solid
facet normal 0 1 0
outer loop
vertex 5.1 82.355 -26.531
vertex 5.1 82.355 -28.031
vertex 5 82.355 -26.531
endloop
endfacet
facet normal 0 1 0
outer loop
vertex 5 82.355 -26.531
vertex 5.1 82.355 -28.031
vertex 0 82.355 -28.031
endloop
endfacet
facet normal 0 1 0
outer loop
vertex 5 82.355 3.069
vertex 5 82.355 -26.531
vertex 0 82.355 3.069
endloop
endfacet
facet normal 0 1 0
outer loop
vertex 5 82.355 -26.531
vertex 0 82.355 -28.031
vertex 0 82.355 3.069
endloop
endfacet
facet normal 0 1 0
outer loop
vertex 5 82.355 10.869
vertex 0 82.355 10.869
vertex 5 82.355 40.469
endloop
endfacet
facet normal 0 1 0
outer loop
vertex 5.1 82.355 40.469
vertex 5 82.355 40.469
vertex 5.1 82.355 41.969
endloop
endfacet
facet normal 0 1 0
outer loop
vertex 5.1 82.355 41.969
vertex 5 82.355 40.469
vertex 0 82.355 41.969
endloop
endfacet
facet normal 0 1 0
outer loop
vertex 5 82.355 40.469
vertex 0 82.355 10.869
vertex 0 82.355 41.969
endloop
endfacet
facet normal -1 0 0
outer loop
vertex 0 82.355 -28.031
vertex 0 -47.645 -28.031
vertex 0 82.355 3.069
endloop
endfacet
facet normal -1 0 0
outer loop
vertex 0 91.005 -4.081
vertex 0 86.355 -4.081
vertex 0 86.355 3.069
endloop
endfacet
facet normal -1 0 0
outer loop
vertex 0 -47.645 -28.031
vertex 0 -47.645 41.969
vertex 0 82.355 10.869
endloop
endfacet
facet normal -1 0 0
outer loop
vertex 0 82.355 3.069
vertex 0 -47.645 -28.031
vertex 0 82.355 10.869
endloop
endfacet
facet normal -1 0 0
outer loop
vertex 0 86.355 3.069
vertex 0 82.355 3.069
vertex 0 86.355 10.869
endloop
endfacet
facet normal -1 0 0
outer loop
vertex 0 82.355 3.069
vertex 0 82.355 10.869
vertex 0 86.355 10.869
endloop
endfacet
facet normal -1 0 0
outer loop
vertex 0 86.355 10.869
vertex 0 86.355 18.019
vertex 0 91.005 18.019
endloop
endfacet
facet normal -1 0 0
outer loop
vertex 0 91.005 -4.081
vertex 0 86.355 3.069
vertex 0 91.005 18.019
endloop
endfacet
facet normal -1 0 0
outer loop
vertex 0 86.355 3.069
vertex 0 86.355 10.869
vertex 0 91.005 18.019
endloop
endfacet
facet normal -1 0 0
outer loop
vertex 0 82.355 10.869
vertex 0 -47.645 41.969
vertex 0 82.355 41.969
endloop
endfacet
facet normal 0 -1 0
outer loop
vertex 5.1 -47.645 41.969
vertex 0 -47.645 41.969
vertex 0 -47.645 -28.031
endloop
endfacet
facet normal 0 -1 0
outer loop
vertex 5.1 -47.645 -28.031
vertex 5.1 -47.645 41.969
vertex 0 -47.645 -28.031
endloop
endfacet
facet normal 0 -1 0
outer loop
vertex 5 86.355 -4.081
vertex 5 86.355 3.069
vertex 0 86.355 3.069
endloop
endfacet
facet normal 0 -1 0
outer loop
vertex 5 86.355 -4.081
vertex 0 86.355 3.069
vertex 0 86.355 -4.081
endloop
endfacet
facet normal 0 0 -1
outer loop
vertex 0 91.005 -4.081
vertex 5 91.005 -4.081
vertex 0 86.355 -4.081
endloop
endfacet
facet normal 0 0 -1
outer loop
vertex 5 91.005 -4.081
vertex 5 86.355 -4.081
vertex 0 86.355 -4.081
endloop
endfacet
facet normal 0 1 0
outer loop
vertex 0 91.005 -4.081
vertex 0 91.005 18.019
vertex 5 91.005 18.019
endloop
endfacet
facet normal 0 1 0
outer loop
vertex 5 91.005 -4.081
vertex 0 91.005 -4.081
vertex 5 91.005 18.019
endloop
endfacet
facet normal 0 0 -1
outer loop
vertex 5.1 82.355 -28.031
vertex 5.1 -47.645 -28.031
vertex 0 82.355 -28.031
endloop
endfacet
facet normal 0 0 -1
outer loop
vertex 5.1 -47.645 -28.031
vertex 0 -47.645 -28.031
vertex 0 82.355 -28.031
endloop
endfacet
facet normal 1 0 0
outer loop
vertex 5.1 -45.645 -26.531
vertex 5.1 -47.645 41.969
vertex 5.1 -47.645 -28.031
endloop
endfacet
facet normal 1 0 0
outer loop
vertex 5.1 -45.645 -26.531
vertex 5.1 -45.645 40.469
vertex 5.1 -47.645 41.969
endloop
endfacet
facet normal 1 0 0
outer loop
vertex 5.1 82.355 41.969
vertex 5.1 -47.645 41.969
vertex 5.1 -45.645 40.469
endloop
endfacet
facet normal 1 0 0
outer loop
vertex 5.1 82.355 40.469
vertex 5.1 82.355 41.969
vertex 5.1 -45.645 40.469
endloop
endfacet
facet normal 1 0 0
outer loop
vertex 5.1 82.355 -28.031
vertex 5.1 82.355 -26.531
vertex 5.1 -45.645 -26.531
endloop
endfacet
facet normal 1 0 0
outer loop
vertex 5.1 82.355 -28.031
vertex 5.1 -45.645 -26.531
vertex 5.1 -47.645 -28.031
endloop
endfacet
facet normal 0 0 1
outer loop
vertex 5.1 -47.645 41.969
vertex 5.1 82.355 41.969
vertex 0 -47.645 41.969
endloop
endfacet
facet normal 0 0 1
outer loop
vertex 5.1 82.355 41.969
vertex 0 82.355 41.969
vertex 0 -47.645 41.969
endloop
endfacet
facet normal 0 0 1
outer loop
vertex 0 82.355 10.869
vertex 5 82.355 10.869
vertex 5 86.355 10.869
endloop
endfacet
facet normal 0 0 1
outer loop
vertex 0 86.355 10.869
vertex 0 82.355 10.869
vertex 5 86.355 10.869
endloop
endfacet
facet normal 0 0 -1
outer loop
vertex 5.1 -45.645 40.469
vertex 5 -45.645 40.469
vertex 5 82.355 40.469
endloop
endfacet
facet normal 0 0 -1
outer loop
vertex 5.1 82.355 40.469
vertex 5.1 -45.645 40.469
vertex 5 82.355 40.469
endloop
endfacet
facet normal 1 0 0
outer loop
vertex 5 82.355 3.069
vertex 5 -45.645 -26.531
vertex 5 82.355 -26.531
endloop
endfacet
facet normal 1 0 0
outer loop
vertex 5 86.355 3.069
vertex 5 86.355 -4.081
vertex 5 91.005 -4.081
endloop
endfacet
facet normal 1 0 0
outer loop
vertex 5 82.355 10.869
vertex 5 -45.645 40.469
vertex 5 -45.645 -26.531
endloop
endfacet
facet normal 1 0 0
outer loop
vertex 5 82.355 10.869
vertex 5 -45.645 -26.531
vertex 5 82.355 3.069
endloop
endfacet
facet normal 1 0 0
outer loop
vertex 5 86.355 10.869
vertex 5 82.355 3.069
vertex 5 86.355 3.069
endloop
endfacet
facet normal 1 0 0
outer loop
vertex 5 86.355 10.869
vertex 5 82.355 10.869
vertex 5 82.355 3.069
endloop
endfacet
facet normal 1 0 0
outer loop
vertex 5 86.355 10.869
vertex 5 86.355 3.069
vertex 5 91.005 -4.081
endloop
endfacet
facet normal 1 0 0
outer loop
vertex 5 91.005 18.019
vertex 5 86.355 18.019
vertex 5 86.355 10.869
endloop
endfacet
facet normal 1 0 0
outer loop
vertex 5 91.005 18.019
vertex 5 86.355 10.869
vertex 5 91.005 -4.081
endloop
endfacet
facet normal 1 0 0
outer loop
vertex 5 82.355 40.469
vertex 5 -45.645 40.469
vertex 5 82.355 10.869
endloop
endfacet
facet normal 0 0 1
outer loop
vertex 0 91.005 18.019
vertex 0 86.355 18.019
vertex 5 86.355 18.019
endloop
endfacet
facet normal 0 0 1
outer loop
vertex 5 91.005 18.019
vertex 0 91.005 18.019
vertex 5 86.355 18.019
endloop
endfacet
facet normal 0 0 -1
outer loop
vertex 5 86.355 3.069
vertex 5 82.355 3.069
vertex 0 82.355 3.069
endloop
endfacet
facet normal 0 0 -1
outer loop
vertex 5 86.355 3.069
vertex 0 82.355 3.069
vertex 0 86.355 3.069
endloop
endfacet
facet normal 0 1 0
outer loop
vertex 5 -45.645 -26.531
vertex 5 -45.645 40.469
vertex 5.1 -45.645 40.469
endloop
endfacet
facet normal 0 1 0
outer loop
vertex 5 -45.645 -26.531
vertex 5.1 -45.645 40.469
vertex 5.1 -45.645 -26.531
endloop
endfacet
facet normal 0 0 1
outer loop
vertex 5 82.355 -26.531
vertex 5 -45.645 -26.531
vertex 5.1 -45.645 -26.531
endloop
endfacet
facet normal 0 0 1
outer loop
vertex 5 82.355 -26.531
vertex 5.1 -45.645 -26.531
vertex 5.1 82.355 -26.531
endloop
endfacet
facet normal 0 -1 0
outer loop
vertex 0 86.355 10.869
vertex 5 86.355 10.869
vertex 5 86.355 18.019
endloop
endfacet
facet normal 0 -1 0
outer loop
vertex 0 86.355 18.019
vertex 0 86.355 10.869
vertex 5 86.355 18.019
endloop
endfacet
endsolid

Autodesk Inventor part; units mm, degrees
ref_plane "YZ Plane" through (0, 0, 0) normal (1, 0, 0) x (0, 1, 0)
ref_plane "XZ Plane" through (0, 0, 0) normal (0, 1, 0) x (-1, 0, 0)
ref_plane "XY Plane" through (0, 0, 0) normal (0, 0, 1) x (1, 0, 0)
sketch "Sketch1" plane through (0, 0, 0) normal (1, 0, 0) x (0, 1, 0)
  line L0 (82.3549, 41.969) -> (-47.6451, 41.969)
  line L1 (-47.6451, 41.969) -> (-47.6451, -28.031)
  line L2 (-47.6451, -28.031) -> (82.3549, -28.031)
  line L3 (82.3549, -28.031) -> (82.3549, 41.969)
  point P0 (0, 0)
  dimension "d0" = 130
  dimension "d1" = 70
extrude "Extrusion1" add sketch "Sketch1" along normal blind 5
sketch "Sketch13" plane through (5, 0, 0) normal (1, 0, 0) x (0, 0, -1)
  line L0 (-41.969, -47.6451) -> (28.031, -47.6451) projected
  line L1 (28.031, 82.3549) -> (-41.969, 82.3549) projected
  line L2 (28.031, -47.6451) -> (26.531, -47.6451)
  line L3 (26.531, -47.6451) -> (26.531, 82.3549)
  line L4 (26.531, 82.3549) -> (28.031, 82.3549)
  line L5 (28.031, 82.3549) -> (28.031, -47.6451)
  line L6 (-41.969, 82.3549) -> (-41.969, -47.6451) projected
  line L7 (28.031, 82.3549) -> (-41.969, 82.3549) projected
  line L8 (-41.969, -47.6451) -> (-40.469, -47.6451)
  line L9 (-40.469, -47.6451) -> (-40.469, 82.3549)
  line L10 (-40.469, 82.3549) -> (-41.969, 82.3549)
  line L11 (-41.969, 82.3549) -> (-41.969, -47.6451)
  line L12 (28.031, -47.6451) -> (-41.969, -47.6451)
  line L13 (-41.969, -47.6451) -> (-41.969, -45.6451)
  line L14 (-41.969, -45.6451) -> (28.031, -45.6451)
  line L15 (28.031, -45.6451) -> (28.031, -47.6451)
  point P0 (0, 0)
  point P1 (10.031, 62.3549)
  point P2 (-5.969, 62.3549)
  point P3 (26.531, -45.6451)
  point P4 (-40.469, -45.6451)
  point P5 (18.031, 62.3549)
  dimension "d42" = 1.5
  dimension "d43" = 1.5
  dimension "d44" = 2
extrude "Extrusion7" add sketch "Sketch13" along normal blind 0.1 contours L6 L14 L9 L0 | L9 L14 L3 L0 | L6 L1 L9 L14 | L3 L14 L5 L0 | L3 L1 L5 L14
sketch "Sketch14" plane through (0, 82.3549, 41.969) normal (0, 1, 0) x (1, 0, 0)
  line L0 (5, 1.5) -> (5, 68.5) projected
  line L1 (5, 68.5) -> (5, 46.05)
  line L2 (5, 1.5) -> (5, 23.95)
  line L3 (5, 46.05) -> (0, 46.05)
  line L4 (5, 29.05) -> (5, 46.05)
  line L5 (0, 70) -> (0, 0) projected
  line L6 (5, 46.05) -> (0, 46.05)
  line L7 (0, 46.05) -> (0, 23.95)
  line L8 (0, 23.95) -> (5, 23.95)
  line L9 (5, 23.95) -> (5, 46.05)
  point P0 (0, 41.969)
  dimension "d47" = 22.45
  dimension "d48" = 22.45
extrude "Extrusion8" add sketch "Sketch14" along normal blind 8.65
sketch "Sketch15" plane through (5, 0, 0) normal (1, 0, 0) x (0, 0, -1)
  line L0 (28.031, 82.3549) -> (4.081, 82.3549) projected
  line L1 (4.081, 82.3549) -> (-3.069, 82.3549)
  line L2 (-3.069, 82.3549) -> (-3.069, 86.3549)
  line L3 (-3.069, 86.3549) -> (4.081, 86.3549)
  line L4 (4.081, 86.3549) -> (4.081, 82.3549)
  line L5 (-18.019, 82.3549) -> (-40.469, 82.3549) projected
  line L6 (-18.019, 82.3549) -> (-10.869, 82.3549)
  line L7 (-10.869, 82.3549) -> (-10.869, 86.3549)
  line L8 (-10.869, 86.3549) -> (-18.019, 86.3549)
  line L9 (-18.019, 86.3549) -> (-18.019, 82.3549)
  point P0 (0, 0)
  dimension "d51" = 7.15
  dimension "d52" = 7.15
  dimension "d55" = 4
extrude "Extrusion9" cut sketch "Sketch15" against normal blind 8.65
properties part number "baseplateproto1"
